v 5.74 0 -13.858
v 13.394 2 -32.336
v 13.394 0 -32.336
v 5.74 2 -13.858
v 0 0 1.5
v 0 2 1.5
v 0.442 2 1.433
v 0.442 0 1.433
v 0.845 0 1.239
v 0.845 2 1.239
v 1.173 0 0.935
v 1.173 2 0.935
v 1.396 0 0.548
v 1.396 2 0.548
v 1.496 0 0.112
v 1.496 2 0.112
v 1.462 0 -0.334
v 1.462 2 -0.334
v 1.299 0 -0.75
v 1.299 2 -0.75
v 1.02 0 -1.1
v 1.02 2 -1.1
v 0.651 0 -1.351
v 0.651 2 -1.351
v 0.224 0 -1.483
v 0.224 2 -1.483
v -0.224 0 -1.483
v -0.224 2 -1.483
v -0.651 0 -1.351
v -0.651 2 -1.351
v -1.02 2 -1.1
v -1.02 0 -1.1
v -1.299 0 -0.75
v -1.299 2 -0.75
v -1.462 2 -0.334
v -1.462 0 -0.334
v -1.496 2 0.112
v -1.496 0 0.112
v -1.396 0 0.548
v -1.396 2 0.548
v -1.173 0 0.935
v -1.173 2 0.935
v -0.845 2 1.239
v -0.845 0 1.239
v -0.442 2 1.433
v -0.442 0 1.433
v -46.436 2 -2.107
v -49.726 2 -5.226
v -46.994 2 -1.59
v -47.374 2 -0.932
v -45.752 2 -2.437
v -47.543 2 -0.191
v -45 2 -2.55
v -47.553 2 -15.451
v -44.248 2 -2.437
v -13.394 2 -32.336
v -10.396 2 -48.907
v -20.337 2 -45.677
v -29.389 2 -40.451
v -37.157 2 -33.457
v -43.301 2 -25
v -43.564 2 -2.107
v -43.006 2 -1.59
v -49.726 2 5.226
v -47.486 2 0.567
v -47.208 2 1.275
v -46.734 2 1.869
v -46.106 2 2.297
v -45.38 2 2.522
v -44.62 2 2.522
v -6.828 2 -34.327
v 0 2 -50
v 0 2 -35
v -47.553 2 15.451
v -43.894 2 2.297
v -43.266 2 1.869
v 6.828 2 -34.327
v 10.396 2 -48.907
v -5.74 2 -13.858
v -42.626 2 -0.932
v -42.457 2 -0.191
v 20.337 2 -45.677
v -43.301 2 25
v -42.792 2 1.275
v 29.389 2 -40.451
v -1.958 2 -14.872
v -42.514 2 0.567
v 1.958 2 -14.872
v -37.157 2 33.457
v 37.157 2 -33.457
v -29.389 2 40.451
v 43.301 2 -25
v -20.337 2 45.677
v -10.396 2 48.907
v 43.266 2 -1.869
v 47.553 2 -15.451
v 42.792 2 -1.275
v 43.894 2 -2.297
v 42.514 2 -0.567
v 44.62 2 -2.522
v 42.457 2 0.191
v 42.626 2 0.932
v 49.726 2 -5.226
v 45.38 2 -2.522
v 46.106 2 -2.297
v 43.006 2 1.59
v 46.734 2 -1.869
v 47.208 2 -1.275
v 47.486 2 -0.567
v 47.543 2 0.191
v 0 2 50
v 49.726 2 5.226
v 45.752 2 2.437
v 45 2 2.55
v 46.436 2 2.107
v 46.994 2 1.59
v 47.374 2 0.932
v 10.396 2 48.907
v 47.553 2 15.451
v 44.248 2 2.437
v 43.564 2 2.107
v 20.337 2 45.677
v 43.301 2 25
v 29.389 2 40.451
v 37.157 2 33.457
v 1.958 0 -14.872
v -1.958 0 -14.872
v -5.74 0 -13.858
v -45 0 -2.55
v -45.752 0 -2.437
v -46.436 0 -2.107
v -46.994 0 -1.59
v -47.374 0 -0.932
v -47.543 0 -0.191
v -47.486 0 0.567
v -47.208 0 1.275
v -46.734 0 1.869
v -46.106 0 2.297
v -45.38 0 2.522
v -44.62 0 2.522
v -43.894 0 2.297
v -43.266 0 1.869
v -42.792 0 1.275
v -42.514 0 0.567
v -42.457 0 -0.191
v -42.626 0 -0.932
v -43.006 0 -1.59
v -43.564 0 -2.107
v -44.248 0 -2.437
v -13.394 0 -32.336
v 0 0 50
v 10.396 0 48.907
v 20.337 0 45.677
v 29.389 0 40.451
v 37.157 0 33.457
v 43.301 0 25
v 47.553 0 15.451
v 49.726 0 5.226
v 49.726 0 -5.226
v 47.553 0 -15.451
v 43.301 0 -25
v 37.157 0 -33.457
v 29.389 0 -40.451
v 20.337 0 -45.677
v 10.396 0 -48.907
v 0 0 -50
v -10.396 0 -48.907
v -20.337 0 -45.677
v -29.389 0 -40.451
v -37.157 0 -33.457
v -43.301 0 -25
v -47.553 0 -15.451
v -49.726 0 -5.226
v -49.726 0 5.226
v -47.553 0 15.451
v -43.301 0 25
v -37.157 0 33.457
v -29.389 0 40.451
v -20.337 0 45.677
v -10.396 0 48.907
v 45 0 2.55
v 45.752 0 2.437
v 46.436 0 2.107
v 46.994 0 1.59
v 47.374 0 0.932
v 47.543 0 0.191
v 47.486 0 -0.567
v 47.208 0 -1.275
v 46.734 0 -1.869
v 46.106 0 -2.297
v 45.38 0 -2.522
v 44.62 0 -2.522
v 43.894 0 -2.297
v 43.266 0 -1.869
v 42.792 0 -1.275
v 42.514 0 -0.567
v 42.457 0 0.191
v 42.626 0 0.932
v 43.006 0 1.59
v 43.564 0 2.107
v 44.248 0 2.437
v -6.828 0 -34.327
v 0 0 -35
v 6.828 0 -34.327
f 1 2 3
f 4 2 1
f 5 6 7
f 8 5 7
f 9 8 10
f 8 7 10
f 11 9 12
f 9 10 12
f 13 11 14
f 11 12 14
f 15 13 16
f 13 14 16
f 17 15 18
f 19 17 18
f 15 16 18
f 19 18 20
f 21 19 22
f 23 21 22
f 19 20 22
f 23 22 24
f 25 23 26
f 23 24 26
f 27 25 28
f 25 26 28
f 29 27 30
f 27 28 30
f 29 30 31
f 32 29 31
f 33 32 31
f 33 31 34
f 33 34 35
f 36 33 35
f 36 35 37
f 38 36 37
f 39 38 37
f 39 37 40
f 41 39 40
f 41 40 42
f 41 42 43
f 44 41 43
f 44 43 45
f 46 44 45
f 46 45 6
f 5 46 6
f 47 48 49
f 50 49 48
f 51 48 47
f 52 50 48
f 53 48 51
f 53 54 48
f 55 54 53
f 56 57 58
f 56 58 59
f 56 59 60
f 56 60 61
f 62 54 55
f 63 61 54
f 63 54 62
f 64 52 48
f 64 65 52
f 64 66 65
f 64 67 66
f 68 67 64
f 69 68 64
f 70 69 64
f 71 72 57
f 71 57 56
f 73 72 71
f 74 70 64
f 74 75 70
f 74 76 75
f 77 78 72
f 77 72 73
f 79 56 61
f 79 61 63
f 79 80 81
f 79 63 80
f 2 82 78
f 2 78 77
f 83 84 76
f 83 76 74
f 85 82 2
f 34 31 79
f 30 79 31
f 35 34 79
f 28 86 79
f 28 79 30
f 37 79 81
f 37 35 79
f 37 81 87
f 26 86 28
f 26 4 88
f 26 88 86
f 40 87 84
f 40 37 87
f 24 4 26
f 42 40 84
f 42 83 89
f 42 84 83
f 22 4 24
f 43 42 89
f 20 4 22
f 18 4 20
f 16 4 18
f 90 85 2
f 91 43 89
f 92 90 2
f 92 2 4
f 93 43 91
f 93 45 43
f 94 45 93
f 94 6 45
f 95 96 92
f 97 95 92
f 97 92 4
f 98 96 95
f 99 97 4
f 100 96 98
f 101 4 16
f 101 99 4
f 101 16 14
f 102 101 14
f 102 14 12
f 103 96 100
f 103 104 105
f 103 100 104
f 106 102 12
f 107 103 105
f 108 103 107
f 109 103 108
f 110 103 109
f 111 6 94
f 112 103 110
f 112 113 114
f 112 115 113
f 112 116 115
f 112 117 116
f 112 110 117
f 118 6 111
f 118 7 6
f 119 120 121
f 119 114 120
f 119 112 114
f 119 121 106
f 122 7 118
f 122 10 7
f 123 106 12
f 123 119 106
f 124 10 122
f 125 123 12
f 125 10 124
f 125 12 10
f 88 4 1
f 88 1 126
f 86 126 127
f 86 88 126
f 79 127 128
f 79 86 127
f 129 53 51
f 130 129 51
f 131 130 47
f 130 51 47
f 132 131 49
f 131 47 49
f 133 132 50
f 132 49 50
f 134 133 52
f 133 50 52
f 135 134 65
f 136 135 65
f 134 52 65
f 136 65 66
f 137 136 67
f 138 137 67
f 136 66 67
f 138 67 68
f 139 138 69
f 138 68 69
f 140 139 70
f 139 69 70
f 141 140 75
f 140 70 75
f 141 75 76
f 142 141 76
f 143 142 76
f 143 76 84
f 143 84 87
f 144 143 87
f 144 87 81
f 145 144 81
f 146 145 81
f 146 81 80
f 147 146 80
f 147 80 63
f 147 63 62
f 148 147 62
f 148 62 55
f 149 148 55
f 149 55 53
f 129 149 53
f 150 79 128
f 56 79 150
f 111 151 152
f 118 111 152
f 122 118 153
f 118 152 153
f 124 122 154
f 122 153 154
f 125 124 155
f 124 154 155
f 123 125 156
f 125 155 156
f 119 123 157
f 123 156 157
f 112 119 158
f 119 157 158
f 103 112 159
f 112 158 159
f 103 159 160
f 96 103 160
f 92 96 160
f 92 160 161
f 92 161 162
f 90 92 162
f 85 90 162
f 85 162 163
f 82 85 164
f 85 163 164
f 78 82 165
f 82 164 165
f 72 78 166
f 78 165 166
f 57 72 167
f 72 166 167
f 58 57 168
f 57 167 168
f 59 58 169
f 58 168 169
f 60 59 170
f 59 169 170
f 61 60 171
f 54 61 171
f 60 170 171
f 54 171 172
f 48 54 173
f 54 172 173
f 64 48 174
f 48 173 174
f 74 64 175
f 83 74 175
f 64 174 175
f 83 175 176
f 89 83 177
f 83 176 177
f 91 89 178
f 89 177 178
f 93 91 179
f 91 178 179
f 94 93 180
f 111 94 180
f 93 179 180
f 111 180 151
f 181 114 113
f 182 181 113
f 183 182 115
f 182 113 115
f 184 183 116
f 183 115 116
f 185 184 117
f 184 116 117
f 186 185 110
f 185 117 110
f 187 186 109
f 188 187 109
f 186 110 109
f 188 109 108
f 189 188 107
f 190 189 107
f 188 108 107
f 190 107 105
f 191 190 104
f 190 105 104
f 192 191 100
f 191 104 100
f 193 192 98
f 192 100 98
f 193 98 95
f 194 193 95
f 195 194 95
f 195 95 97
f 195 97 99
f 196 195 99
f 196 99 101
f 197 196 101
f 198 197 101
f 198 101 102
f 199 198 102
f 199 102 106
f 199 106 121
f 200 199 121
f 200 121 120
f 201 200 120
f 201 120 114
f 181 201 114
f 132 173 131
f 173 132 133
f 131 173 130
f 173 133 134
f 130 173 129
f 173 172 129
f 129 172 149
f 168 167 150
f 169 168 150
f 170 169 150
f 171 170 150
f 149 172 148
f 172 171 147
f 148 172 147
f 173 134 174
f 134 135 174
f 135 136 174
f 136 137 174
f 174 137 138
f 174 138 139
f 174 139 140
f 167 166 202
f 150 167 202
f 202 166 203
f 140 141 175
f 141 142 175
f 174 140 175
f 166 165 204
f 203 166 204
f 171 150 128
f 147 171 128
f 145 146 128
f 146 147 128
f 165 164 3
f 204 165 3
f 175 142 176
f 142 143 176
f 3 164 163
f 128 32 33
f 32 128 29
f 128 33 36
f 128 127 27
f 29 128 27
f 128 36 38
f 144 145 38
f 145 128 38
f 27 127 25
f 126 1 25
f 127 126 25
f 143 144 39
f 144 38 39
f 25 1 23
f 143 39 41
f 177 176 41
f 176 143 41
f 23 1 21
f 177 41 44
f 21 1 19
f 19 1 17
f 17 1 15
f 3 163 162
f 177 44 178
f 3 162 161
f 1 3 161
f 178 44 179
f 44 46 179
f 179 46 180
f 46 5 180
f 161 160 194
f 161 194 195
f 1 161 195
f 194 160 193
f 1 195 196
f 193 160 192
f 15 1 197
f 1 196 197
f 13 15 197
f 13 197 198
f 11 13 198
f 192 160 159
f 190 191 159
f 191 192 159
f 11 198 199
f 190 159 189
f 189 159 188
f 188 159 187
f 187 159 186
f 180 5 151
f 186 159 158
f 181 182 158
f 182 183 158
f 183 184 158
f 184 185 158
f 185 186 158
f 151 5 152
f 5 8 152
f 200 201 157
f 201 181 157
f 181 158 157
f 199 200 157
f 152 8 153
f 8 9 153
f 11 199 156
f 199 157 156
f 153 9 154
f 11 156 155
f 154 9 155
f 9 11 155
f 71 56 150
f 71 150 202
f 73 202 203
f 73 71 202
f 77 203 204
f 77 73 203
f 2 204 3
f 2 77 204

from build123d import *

# Parameters (mm, degrees)
SKETCH2_R           = 50
BOSS_EXTRUDE1_DEPTH = 2
CUT_EXTRUDE1_REACH  = 72.739
SKETCH4_R           = 2.55
CUT_EXTRUDE2_DEPTH  = 71.738956735
CIRPATTERN1_COUNT   = 2
SKETCH5_R           = 1.5
CUT_EXTRUDE3_DEPTH  = 71.738956735


with BuildPart() as part:
    # Sketch2 → Boss-Extrude1 (new body)
    with BuildSketch(Plane(origin=(0, 0, 0), x_dir=(1, 0, 0), z_dir=(0, 1, 0))):
        with Locations(Location((0, 0, 0), (0, 0, 270))):
            Circle(SKETCH2_R)
    extrude(amount=BOSS_EXTRUDE1_DEPTH)

    # Sketch3 → Cut-Extrude1 (cut, up to next)
    with BuildSketch(Plane(origin=(0, 2, 0), x_dir=(1, 0, 0), z_dir=(0, 1, 0)), mode=Mode.PRIVATE) as cut_extrude1_sk1:
        with BuildLine():
            Line((-5.740251485, 13.858192988), (-13.393920133, 32.335783638))
            ThreePointArc((-13.393920133, 32.335783638), (0, 35), (13.393920133, 32.335783638))
            Line((13.393920133, 32.335783638), (5.740251485, 13.858192988))
            ThreePointArc((5.740251485, 13.858192988), (0, 15), (-5.740251485, 13.858192988))
        make_face()
    cut_extrude1_tool1 = extrude(cut_extrude1_sk1.sketch, amount=-CUT_EXTRUDE1_REACH, mode=Mode.PRIVATE) & part.part
    add(cut_extrude1_tool1.solids().sort_by_distance((0, 2, -25.661711))[0], mode=Mode.SUBTRACT)

    # Sketch4 → Cut-Extrude2 (cut, through all)
    with BuildSketch(Plane(origin=(0, 2, 0), x_dir=(1, 0, 0), z_dir=(0, 1, 0))):
        with Locations(Location((45, 0, 0), (0, 0, 270))):
            Circle(SKETCH4_R)
    cut_extrude2 = extrude(amount=-CUT_EXTRUDE2_DEPTH, mode=Mode.SUBTRACT)

    # CirPattern1: Cut-Extrude2 ×2 about axis
    cirpattern1_axis = Axis((0, 0, 0), (0, 1, 0))
    for i in range(1, CIRPATTERN1_COUNT):
        add(cut_extrude2.rotate(cirpattern1_axis, i * 360 / CIRPATTERN1_COUNT), mode=Mode.SUBTRACT)

    # Sketch5 → Cut-Extrude3 (cut, through all)
    with BuildSketch(Plane(origin=(0, 2, 0), x_dir=(1, 0, 0), z_dir=(0, 1, 0))):
        with Locations(Location((0, 0, 0), (0, 0, 270))):
            Circle(SKETCH5_R)
    extrude(amount=-CUT_EXTRUDE3_DEPTH, mode=Mode.SUBTRACT)


solid = part.part
